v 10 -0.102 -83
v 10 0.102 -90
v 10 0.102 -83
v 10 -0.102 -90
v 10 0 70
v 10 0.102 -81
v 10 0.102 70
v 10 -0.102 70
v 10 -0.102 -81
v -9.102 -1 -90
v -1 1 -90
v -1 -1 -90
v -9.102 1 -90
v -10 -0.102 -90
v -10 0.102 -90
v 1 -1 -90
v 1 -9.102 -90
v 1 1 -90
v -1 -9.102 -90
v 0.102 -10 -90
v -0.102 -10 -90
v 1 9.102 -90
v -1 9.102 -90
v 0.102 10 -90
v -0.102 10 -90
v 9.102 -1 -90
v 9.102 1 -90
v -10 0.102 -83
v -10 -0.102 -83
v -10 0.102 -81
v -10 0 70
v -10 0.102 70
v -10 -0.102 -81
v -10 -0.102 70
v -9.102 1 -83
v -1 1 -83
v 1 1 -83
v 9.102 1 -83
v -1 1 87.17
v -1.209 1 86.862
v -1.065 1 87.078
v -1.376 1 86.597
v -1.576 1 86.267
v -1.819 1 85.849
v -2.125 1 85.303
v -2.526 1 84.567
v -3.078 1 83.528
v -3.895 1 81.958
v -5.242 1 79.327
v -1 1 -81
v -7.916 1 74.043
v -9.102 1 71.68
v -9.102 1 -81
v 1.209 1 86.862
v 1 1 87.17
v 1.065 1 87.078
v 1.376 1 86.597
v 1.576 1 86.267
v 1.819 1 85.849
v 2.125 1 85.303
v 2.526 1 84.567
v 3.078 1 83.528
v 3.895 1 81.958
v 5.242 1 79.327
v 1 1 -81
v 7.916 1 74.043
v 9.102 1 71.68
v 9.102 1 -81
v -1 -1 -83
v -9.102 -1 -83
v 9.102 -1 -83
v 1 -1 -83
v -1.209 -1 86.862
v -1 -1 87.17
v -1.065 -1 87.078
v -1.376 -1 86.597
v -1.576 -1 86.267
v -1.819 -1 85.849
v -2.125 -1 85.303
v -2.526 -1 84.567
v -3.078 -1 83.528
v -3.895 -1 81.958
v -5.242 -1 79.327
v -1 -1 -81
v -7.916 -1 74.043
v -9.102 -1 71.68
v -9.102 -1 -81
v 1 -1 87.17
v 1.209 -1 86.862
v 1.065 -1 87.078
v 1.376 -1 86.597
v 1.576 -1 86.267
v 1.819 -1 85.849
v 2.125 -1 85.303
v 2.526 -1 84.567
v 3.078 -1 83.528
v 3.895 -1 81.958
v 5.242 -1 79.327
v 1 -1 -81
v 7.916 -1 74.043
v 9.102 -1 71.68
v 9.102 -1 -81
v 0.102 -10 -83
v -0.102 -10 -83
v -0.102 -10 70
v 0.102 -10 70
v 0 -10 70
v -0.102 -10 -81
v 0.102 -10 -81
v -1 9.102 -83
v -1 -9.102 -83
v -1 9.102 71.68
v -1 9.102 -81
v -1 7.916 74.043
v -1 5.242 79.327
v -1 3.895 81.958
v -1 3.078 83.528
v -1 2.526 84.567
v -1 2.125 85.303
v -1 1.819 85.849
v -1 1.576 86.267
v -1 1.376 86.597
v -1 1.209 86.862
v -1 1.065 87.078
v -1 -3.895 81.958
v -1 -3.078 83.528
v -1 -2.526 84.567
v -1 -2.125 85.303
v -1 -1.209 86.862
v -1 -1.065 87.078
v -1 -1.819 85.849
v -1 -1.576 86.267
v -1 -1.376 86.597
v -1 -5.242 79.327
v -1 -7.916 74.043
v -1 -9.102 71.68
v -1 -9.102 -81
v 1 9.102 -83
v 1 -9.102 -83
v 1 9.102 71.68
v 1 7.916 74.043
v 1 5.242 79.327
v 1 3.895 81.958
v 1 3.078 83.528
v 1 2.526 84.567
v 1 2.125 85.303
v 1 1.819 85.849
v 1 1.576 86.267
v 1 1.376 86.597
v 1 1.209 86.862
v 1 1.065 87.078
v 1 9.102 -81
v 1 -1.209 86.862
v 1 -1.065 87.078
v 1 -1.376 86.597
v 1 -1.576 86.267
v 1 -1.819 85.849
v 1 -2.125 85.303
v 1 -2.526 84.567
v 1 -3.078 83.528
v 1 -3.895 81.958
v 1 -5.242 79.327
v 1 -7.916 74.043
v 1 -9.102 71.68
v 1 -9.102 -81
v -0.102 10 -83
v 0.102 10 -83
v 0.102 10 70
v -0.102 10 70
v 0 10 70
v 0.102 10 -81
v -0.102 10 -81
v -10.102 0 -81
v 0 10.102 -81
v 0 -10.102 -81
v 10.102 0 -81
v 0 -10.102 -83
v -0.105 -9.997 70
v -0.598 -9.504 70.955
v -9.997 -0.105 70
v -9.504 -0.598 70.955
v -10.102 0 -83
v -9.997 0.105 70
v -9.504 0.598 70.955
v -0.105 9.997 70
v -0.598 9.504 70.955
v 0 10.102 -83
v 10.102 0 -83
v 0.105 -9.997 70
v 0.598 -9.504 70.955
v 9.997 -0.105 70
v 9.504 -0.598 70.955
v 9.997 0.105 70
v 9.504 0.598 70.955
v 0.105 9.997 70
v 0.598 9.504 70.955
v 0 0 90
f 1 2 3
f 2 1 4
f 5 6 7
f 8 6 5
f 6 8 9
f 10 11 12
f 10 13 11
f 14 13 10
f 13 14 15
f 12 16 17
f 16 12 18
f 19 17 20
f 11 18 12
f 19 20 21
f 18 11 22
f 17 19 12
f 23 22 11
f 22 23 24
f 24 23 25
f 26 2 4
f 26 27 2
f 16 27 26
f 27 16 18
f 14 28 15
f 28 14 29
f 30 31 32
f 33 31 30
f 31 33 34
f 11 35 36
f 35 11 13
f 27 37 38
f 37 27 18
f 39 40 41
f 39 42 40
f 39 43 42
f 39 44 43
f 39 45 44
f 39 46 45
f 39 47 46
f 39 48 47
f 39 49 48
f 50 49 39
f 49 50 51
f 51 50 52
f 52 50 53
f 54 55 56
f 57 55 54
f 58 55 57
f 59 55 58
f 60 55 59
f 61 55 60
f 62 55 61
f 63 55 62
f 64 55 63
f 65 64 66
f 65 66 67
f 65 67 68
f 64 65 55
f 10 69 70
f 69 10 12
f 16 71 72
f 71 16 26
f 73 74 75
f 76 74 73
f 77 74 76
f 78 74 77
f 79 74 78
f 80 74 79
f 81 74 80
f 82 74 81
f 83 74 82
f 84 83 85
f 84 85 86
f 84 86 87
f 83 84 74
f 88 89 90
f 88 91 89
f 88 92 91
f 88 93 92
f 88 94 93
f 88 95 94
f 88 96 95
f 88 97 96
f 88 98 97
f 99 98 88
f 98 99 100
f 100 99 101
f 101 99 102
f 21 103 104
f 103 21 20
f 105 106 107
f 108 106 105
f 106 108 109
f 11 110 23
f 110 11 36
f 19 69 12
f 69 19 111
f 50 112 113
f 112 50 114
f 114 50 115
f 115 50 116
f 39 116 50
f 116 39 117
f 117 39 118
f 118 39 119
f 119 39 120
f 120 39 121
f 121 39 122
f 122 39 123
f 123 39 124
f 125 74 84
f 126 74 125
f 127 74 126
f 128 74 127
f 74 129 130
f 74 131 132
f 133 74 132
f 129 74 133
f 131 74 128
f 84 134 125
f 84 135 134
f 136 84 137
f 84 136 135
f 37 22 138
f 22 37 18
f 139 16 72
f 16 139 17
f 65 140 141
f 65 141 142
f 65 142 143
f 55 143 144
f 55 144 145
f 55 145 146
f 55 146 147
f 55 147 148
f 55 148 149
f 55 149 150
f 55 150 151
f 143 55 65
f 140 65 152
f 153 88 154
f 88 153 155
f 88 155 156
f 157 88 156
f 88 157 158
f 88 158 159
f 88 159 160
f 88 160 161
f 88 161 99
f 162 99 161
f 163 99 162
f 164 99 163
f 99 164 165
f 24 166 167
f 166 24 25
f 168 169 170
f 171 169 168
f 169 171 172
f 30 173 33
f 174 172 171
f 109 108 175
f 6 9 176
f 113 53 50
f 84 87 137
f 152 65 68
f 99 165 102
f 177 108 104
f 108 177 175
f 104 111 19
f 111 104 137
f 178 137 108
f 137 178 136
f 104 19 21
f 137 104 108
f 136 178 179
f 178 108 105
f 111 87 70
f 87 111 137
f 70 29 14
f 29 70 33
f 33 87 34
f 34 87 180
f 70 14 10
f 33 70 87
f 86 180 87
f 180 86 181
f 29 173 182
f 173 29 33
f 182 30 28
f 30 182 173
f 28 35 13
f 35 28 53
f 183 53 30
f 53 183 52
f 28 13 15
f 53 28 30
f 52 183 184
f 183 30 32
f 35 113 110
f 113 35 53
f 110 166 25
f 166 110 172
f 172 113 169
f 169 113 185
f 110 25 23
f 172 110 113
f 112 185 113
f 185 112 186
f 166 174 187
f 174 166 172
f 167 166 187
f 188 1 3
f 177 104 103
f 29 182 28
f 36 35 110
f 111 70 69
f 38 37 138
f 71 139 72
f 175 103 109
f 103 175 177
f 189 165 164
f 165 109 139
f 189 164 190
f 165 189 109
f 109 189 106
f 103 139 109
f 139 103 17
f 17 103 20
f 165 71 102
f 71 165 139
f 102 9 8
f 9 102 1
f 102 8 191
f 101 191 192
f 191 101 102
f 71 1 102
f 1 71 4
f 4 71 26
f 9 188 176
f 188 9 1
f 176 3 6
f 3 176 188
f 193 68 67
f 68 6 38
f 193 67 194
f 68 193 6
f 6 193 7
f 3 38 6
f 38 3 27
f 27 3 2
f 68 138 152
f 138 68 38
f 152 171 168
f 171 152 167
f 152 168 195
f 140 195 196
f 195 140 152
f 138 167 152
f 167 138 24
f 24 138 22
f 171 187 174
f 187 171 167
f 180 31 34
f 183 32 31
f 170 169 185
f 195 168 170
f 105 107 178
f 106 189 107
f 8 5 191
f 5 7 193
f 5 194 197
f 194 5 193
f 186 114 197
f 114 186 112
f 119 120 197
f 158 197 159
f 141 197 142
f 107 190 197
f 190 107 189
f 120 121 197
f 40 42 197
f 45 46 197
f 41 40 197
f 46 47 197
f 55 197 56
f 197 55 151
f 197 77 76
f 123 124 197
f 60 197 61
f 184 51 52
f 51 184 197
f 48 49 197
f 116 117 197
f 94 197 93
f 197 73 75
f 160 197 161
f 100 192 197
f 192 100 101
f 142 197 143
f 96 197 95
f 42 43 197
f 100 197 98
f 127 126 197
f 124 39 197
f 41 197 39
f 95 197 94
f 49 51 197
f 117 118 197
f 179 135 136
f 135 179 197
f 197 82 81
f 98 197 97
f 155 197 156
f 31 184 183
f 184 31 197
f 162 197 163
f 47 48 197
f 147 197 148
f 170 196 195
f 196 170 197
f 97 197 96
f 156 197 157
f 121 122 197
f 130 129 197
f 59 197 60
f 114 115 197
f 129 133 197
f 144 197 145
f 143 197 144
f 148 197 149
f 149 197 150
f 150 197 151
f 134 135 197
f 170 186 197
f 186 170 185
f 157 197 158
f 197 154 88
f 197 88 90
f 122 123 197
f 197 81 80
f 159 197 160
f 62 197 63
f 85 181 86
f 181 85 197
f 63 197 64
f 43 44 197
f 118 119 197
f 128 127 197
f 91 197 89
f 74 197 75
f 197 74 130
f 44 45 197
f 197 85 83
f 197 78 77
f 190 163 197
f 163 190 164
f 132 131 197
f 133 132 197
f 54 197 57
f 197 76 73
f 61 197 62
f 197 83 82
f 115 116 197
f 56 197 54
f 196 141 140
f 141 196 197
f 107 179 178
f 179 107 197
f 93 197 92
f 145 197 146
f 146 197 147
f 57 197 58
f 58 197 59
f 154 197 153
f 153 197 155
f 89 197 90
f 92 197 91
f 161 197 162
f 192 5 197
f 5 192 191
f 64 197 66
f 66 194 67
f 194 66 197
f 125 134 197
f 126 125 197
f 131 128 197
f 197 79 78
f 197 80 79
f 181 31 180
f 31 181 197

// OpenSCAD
$fn = 100;  // Number of fragments used to construct curves and circles



module sprinkler_holder()
{
    // anchor
    anchor_width = 20;
    anchor_thickness = 2;
    anchor_length = 180;
    tip_length = anchor_width;
    stopper_position = anchor_length/2-4*anchor_thickness;
    
    intersection() {
        difference() {
            union() {
                cube([anchor_width, anchor_thickness, anchor_length], center=true);
                rotate([0,0,90])
                cube([anchor_width, anchor_thickness, anchor_length], center=true);
                // stopper
                translate([0,0,-stopper_position])
                rotate([0,0,45])
                scale([1/1.4,1/1.4,1])
                cube([anchor_width, anchor_width, anchor_thickness], center=true);
            }
            
            translate([0,0,anchor_length/2-tip_length])
            difference() {
                scale(1.01)
                translate([-anchor_width/2,-anchor_width/2,0])
                cube(anchor_width);
                cylinder(d2=0, d1=anchor_width, h=tip_length);
            }
        }
        
        rotate([0,0,45])
        cube([anchor_width/1.4, anchor_width/1.4, anchor_length], center=true);
    }
}

sprinkler_holder();
